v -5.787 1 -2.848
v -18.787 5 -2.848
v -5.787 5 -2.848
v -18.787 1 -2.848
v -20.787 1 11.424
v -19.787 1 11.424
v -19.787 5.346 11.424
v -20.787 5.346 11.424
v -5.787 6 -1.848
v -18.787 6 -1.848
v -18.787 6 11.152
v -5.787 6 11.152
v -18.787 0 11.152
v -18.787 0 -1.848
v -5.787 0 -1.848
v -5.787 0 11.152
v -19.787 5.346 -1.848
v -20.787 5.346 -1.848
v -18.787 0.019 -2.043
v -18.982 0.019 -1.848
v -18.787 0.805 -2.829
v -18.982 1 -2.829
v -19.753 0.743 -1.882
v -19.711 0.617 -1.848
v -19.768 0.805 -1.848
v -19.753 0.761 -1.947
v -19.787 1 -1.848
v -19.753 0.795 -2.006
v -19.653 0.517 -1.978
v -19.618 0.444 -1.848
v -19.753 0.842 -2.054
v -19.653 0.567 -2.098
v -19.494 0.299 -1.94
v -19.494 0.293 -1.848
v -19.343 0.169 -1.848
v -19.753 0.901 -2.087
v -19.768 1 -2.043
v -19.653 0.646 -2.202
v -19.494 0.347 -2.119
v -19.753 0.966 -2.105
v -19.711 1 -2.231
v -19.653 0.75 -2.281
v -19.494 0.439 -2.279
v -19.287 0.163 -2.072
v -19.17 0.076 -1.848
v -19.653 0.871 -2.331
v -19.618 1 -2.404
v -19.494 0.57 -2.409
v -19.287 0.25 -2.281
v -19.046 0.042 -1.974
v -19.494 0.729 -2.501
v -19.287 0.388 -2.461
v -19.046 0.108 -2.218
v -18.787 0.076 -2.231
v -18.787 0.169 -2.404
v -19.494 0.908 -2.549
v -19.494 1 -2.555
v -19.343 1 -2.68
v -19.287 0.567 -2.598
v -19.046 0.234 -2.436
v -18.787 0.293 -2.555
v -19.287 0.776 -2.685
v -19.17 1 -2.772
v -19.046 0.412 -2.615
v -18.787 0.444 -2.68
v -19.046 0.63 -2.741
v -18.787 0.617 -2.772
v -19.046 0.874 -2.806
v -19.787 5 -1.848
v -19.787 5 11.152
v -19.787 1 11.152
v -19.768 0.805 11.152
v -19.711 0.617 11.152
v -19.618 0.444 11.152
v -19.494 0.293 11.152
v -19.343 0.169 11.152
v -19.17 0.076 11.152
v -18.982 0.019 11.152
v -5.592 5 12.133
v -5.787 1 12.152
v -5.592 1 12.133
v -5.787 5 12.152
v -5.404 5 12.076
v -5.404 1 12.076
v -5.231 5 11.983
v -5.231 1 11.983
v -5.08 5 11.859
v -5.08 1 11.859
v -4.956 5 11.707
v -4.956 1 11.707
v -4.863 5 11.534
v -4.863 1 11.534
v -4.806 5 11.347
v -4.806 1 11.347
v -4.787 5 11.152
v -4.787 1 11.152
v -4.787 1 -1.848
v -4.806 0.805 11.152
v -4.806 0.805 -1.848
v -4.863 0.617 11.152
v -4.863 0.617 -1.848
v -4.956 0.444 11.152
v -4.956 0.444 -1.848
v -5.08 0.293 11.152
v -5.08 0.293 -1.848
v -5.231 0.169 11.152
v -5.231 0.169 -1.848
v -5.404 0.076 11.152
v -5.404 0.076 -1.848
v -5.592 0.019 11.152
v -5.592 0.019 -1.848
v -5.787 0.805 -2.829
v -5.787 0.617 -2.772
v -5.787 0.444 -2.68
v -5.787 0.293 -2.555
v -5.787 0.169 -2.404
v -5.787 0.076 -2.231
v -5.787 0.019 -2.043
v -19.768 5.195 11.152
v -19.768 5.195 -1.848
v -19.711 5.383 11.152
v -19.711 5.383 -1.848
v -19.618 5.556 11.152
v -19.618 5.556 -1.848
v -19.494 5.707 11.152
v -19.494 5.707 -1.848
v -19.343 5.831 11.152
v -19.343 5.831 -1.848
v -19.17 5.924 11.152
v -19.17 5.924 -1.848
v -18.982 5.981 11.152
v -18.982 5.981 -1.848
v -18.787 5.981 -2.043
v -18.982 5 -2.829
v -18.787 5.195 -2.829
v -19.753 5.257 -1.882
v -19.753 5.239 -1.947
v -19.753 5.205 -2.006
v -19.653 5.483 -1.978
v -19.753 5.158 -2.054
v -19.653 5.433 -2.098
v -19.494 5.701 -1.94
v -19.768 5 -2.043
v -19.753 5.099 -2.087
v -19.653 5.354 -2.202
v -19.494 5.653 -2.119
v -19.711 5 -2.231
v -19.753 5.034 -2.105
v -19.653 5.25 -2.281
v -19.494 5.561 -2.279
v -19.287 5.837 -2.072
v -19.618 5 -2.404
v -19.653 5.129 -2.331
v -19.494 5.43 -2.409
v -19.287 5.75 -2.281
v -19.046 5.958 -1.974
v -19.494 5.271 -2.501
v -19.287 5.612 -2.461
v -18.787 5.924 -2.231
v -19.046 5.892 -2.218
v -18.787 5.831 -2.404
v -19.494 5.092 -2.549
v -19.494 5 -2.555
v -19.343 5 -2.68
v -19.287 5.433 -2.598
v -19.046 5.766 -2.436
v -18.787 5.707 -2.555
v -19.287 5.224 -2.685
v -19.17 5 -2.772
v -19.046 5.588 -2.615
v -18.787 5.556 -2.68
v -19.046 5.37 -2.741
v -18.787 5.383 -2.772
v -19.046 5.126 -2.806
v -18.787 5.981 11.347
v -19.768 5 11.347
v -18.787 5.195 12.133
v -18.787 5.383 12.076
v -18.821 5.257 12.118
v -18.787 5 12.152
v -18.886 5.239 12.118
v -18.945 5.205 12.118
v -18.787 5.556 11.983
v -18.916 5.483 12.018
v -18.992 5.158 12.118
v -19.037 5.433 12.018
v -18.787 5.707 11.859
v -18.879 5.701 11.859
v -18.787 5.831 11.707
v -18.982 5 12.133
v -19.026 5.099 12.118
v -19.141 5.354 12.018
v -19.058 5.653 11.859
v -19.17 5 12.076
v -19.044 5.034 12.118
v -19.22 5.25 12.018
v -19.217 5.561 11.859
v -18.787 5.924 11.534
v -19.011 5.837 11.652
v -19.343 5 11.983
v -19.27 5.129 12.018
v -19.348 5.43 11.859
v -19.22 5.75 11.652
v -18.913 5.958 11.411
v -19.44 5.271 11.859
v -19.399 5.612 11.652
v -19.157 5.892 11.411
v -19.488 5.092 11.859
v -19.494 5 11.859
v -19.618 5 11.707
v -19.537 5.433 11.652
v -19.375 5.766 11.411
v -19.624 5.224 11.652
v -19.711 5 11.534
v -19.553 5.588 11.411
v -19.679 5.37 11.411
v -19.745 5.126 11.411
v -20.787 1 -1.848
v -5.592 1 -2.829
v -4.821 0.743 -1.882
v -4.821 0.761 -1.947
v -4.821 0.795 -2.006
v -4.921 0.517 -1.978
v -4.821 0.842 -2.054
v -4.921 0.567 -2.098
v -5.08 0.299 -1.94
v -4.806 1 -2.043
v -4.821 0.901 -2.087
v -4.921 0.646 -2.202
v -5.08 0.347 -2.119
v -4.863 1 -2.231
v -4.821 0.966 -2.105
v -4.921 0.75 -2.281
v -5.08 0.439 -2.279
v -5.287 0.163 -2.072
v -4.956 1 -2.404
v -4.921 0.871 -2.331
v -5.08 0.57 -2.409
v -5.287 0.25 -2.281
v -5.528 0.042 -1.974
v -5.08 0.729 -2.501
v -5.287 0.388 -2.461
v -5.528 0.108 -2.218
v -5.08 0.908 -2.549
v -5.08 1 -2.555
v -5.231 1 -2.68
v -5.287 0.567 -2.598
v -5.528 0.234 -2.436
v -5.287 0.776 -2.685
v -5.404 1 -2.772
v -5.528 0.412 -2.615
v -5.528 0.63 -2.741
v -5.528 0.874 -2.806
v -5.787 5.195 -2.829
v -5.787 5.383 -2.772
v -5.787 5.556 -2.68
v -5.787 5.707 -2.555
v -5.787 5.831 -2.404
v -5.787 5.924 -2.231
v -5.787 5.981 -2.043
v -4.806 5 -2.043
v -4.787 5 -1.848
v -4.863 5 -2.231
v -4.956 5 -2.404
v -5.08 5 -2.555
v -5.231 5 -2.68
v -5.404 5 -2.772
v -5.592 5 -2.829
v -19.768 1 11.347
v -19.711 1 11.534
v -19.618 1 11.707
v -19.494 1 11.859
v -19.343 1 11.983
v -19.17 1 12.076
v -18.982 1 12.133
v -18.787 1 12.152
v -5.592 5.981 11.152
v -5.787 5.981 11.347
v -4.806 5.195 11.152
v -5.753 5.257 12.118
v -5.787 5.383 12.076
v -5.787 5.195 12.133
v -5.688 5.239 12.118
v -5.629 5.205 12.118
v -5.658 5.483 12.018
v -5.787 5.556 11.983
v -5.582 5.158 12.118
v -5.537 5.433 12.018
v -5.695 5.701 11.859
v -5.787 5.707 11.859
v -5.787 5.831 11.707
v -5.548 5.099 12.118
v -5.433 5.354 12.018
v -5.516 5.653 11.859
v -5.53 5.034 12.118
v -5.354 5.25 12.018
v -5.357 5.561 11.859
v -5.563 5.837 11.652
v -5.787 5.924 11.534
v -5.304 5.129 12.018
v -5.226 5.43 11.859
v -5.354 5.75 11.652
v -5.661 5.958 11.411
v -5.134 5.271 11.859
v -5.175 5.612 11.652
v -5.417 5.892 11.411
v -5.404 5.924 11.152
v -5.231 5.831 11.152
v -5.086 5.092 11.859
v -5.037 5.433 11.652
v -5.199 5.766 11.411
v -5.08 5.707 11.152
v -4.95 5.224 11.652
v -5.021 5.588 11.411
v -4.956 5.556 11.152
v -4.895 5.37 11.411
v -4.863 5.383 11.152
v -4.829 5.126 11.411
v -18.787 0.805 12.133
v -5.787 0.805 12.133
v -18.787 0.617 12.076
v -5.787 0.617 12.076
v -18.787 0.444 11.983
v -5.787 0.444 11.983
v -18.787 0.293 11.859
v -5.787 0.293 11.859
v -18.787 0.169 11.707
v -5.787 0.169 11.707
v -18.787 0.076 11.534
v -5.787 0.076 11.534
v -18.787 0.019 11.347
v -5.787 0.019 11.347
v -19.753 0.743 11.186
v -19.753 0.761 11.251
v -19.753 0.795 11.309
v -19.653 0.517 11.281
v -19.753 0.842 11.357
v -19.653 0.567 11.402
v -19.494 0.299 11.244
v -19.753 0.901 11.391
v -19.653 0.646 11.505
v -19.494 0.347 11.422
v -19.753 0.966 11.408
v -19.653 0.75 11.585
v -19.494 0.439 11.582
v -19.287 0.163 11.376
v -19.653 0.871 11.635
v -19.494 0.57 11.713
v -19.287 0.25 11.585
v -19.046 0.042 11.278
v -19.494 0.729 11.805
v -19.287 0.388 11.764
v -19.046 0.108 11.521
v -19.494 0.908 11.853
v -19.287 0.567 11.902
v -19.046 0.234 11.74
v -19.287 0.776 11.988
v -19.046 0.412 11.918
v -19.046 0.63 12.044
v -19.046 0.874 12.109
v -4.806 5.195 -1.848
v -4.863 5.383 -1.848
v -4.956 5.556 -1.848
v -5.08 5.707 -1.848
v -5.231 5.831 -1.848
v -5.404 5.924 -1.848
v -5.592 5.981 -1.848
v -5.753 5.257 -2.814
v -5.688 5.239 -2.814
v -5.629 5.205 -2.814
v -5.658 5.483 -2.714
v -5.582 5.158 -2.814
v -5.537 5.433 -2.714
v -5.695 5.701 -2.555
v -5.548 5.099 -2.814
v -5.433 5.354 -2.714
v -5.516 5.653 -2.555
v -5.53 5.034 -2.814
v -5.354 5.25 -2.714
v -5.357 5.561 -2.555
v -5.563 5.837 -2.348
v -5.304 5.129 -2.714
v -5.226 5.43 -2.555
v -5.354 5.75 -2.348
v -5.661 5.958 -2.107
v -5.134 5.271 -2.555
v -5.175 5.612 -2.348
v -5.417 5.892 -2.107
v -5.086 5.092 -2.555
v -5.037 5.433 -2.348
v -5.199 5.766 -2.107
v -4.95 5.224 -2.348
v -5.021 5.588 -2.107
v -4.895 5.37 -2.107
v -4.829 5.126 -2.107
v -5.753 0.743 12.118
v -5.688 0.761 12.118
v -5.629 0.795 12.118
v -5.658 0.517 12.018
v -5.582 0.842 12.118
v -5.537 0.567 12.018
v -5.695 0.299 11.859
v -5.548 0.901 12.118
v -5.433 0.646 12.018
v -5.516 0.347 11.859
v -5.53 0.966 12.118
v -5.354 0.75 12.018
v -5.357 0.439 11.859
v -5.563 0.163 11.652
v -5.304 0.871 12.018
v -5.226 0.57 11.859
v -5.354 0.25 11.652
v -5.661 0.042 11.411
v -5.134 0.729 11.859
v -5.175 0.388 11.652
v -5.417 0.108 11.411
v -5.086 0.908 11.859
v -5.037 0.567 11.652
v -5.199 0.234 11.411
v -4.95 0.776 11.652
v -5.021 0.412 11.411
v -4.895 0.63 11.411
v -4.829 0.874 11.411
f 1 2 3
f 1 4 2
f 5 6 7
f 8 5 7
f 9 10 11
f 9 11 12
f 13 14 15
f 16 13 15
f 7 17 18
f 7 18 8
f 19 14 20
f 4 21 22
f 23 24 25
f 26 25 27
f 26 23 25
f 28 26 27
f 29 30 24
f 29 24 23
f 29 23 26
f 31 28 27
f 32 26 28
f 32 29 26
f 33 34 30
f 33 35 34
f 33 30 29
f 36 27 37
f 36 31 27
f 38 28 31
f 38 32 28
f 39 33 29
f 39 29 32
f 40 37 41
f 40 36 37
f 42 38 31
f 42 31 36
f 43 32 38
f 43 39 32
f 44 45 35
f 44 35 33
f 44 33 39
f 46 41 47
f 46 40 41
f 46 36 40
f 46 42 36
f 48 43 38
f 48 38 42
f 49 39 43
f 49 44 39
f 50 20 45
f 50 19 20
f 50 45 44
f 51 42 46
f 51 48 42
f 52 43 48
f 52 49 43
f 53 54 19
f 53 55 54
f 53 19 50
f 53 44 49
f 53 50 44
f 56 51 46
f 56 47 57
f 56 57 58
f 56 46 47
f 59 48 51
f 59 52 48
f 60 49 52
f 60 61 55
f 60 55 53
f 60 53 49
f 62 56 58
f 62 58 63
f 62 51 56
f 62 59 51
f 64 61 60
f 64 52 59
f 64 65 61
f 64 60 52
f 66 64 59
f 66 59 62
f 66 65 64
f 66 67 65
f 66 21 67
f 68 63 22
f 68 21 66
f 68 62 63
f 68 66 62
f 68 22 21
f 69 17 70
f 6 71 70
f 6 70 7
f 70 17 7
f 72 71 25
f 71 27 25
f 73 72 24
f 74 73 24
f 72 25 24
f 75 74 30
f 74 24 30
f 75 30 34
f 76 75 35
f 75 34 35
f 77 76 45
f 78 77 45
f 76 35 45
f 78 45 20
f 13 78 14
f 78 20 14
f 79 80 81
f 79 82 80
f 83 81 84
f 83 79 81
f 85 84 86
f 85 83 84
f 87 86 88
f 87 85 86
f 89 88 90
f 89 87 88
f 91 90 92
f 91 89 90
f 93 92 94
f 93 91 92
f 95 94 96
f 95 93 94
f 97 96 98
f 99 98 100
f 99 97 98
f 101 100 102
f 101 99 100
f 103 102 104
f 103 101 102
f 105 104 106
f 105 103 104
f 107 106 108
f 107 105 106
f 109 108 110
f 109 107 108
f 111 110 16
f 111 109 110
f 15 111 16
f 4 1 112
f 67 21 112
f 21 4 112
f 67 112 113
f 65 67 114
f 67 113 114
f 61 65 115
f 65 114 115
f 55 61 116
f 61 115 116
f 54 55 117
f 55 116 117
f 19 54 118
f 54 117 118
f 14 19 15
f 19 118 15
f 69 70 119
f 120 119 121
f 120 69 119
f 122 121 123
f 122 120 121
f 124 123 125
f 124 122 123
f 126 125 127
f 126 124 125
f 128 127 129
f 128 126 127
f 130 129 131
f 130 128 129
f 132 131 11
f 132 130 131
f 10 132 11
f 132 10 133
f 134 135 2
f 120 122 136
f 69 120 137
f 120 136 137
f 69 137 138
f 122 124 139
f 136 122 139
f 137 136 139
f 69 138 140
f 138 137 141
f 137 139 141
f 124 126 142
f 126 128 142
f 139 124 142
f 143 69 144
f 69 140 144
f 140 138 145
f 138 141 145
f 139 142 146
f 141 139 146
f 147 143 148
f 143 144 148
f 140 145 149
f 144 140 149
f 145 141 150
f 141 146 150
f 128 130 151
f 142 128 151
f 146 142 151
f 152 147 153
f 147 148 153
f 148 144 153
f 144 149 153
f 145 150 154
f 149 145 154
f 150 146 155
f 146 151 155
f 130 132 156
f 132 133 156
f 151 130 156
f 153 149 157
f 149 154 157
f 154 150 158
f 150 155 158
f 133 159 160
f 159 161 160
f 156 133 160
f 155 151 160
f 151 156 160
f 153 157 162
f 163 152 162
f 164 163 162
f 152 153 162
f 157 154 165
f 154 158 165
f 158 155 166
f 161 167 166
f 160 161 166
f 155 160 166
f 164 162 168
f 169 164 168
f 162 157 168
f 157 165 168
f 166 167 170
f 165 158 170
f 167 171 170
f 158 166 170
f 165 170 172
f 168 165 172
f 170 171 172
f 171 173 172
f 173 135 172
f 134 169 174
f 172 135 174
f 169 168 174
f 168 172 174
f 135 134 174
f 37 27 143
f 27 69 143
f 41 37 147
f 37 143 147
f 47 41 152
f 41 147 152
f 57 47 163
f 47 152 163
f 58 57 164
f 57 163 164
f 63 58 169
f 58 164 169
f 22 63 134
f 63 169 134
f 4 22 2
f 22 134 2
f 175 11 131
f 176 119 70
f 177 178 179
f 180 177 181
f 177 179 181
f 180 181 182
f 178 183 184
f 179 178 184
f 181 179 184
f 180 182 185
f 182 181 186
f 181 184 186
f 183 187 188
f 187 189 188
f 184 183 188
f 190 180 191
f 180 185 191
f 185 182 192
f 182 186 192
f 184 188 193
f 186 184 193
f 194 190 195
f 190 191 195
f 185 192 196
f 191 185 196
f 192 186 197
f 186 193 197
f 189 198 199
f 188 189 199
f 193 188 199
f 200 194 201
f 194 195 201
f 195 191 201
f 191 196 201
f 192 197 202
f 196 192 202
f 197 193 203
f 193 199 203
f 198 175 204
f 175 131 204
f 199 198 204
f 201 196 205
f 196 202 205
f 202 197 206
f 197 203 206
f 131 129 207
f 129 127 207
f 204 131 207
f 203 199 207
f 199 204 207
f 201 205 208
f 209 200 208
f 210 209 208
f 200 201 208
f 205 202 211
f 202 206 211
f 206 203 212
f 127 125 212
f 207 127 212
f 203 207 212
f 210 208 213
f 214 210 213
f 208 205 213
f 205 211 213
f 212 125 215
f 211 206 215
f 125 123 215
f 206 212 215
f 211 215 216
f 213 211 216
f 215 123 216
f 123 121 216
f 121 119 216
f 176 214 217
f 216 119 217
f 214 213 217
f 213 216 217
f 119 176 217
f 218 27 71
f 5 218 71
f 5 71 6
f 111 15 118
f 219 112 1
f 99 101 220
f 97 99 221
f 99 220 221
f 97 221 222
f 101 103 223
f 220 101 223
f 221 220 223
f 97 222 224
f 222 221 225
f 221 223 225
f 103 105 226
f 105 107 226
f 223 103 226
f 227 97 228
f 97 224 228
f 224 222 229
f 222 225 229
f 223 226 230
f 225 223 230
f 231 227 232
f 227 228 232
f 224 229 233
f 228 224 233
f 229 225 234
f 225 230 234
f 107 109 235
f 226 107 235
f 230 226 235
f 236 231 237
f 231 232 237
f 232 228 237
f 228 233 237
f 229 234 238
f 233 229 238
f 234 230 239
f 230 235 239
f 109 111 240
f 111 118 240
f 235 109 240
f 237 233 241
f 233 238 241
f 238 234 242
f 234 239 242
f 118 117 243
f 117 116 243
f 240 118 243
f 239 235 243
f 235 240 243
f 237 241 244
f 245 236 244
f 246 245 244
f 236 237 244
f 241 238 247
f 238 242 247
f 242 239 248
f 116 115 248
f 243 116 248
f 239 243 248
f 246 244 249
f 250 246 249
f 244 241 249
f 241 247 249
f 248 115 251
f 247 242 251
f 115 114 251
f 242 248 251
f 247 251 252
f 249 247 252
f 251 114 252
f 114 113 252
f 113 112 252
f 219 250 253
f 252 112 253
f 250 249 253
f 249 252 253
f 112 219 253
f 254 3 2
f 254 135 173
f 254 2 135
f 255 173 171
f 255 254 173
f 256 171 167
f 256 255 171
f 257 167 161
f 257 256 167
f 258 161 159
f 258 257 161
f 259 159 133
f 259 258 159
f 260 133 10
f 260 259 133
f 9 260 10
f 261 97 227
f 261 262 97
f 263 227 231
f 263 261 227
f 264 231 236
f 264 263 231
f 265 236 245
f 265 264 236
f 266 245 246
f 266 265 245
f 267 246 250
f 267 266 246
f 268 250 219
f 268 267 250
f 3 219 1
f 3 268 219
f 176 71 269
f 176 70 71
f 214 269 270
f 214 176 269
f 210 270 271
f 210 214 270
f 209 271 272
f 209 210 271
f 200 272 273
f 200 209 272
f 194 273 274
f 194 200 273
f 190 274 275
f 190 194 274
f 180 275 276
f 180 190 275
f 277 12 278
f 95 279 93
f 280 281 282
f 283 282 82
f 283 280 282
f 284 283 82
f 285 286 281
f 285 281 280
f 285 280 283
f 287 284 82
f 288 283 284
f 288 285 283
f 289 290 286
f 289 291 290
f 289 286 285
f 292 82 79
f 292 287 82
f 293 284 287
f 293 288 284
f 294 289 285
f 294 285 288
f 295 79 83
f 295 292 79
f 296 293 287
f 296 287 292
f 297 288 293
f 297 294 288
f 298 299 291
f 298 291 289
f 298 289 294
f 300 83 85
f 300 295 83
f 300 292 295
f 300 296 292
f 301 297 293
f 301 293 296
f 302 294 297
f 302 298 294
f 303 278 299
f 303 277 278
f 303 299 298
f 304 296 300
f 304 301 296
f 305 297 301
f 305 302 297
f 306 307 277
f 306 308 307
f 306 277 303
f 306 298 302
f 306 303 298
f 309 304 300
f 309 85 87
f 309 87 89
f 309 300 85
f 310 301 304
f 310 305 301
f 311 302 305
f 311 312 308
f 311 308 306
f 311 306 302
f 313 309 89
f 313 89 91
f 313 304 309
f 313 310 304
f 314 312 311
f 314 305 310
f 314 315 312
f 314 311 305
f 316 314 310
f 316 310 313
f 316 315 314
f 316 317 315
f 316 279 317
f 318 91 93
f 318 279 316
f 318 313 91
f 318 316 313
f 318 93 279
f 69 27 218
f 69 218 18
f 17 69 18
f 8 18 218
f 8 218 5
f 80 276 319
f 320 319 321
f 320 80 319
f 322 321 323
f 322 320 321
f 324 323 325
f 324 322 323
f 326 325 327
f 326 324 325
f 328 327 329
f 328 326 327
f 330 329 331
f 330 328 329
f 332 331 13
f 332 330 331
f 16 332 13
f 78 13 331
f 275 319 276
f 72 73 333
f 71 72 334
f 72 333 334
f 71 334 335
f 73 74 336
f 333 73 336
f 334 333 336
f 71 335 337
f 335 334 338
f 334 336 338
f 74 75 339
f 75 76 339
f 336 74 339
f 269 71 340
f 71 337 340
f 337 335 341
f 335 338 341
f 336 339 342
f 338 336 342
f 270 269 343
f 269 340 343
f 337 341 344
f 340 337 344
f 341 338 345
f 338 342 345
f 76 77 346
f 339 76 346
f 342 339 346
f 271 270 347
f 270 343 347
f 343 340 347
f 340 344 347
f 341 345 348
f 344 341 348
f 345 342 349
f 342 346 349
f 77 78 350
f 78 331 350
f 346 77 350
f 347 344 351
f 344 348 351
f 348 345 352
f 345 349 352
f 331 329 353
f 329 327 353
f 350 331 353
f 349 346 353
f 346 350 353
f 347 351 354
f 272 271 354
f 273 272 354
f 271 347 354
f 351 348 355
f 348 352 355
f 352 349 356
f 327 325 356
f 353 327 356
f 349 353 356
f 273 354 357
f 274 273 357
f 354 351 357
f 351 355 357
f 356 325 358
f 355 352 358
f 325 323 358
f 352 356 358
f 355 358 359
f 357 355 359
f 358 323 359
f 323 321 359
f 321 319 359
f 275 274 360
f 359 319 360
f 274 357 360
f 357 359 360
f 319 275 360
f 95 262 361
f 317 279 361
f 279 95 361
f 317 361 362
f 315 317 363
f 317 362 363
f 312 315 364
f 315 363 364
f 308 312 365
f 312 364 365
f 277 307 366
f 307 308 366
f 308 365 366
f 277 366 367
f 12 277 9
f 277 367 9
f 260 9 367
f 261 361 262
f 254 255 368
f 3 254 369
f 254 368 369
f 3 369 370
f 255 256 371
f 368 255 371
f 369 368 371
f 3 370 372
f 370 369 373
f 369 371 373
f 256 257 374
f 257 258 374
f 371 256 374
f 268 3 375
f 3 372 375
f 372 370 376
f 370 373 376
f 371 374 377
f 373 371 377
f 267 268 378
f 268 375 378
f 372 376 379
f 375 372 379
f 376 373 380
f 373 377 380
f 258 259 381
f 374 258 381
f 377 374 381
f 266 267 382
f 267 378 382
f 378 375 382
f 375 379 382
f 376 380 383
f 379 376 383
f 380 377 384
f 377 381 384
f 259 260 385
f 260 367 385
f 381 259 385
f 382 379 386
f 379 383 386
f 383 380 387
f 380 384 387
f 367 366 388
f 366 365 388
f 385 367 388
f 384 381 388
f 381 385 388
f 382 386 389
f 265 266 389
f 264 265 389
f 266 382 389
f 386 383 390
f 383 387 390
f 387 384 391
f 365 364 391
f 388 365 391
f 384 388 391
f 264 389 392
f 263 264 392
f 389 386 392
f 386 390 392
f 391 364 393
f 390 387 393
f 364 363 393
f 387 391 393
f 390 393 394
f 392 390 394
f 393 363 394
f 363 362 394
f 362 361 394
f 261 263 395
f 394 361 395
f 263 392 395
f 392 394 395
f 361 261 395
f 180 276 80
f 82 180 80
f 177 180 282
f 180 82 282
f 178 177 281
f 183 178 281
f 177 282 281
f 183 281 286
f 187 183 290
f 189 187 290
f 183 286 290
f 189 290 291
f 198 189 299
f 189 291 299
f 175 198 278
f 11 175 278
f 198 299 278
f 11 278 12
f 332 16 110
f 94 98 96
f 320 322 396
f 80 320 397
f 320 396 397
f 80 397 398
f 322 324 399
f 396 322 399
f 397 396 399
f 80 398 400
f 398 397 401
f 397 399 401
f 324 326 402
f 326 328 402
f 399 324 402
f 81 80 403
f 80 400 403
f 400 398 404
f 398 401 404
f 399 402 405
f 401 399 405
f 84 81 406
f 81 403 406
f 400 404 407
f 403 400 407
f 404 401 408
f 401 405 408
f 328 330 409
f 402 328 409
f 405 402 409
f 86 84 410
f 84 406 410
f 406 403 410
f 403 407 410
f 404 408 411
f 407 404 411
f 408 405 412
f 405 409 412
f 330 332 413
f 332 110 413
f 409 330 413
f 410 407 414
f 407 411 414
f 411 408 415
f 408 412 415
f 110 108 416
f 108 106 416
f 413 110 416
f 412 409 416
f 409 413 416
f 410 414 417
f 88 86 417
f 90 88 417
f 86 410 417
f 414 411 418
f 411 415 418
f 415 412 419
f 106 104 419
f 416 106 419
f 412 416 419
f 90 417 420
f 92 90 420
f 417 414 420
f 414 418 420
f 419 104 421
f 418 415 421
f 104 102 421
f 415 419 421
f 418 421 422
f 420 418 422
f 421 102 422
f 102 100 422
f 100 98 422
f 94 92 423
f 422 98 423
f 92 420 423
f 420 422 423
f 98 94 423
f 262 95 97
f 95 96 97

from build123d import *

# Parameters (mm, degrees)
SKETCH1_W           = 15
SKETCH1_H           = 15
BOSS_EXTRUDE1_DEPTH = 6
FILLET1_R           = 1
SKETCH2_W           = 13.272032768
SKETCH2_H           = 4.346157801
BOSS_EXTRUDE2_DEPTH = 1


with BuildPart() as part:
    # Sketch1 → Boss-Extrude1 (new body)
    with BuildSketch(Plane(origin=(0, 0, 0), x_dir=(1, 0, 0), z_dir=(0, 1, 0))):
        with Locations((-12.287002789, -4.651800626)):
            Rectangle(SKETCH1_W, SKETCH1_H)
    extrude(amount=BOSS_EXTRUDE1_DEPTH)

    # Fillet1
    fillet1_edges = [part.edges().sort_by_distance(p)[0] for p in [
        (-4.787002789, 6, 4.651800626),
        (-12.287002789, 6, -2.848199374),
        (-19.787002789, 6, 4.651800626),
        (-12.287002789, 0, -2.848199374),
        (-4.787002789, 0, 4.651800626),
        (-12.287002789, 0, 12.151800626),
        (-19.787002789, 0, 4.651800626),
        (-12.287002789, 6, 12.151800626),
        (-19.787002789, 3, -2.848199374),
        (-4.787002789, 3, -2.848199374),
        (-4.787002789, 3, 12.151800626),
        (-19.787002789, 3, 12.151800626),
    ]]
    fillet(fillet1_edges, radius=FILLET1_R)

    # Sketch2 → Boss-Extrude2 (add)
    with BuildSketch(Plane.ZY.offset(19.787002789)):
        with Locations((4.78781701, 3.173078901)):
            Rectangle(SKETCH2_W, SKETCH2_H)
    extrude(amount=BOSS_EXTRUDE2_DEPTH)


solid = part.part
